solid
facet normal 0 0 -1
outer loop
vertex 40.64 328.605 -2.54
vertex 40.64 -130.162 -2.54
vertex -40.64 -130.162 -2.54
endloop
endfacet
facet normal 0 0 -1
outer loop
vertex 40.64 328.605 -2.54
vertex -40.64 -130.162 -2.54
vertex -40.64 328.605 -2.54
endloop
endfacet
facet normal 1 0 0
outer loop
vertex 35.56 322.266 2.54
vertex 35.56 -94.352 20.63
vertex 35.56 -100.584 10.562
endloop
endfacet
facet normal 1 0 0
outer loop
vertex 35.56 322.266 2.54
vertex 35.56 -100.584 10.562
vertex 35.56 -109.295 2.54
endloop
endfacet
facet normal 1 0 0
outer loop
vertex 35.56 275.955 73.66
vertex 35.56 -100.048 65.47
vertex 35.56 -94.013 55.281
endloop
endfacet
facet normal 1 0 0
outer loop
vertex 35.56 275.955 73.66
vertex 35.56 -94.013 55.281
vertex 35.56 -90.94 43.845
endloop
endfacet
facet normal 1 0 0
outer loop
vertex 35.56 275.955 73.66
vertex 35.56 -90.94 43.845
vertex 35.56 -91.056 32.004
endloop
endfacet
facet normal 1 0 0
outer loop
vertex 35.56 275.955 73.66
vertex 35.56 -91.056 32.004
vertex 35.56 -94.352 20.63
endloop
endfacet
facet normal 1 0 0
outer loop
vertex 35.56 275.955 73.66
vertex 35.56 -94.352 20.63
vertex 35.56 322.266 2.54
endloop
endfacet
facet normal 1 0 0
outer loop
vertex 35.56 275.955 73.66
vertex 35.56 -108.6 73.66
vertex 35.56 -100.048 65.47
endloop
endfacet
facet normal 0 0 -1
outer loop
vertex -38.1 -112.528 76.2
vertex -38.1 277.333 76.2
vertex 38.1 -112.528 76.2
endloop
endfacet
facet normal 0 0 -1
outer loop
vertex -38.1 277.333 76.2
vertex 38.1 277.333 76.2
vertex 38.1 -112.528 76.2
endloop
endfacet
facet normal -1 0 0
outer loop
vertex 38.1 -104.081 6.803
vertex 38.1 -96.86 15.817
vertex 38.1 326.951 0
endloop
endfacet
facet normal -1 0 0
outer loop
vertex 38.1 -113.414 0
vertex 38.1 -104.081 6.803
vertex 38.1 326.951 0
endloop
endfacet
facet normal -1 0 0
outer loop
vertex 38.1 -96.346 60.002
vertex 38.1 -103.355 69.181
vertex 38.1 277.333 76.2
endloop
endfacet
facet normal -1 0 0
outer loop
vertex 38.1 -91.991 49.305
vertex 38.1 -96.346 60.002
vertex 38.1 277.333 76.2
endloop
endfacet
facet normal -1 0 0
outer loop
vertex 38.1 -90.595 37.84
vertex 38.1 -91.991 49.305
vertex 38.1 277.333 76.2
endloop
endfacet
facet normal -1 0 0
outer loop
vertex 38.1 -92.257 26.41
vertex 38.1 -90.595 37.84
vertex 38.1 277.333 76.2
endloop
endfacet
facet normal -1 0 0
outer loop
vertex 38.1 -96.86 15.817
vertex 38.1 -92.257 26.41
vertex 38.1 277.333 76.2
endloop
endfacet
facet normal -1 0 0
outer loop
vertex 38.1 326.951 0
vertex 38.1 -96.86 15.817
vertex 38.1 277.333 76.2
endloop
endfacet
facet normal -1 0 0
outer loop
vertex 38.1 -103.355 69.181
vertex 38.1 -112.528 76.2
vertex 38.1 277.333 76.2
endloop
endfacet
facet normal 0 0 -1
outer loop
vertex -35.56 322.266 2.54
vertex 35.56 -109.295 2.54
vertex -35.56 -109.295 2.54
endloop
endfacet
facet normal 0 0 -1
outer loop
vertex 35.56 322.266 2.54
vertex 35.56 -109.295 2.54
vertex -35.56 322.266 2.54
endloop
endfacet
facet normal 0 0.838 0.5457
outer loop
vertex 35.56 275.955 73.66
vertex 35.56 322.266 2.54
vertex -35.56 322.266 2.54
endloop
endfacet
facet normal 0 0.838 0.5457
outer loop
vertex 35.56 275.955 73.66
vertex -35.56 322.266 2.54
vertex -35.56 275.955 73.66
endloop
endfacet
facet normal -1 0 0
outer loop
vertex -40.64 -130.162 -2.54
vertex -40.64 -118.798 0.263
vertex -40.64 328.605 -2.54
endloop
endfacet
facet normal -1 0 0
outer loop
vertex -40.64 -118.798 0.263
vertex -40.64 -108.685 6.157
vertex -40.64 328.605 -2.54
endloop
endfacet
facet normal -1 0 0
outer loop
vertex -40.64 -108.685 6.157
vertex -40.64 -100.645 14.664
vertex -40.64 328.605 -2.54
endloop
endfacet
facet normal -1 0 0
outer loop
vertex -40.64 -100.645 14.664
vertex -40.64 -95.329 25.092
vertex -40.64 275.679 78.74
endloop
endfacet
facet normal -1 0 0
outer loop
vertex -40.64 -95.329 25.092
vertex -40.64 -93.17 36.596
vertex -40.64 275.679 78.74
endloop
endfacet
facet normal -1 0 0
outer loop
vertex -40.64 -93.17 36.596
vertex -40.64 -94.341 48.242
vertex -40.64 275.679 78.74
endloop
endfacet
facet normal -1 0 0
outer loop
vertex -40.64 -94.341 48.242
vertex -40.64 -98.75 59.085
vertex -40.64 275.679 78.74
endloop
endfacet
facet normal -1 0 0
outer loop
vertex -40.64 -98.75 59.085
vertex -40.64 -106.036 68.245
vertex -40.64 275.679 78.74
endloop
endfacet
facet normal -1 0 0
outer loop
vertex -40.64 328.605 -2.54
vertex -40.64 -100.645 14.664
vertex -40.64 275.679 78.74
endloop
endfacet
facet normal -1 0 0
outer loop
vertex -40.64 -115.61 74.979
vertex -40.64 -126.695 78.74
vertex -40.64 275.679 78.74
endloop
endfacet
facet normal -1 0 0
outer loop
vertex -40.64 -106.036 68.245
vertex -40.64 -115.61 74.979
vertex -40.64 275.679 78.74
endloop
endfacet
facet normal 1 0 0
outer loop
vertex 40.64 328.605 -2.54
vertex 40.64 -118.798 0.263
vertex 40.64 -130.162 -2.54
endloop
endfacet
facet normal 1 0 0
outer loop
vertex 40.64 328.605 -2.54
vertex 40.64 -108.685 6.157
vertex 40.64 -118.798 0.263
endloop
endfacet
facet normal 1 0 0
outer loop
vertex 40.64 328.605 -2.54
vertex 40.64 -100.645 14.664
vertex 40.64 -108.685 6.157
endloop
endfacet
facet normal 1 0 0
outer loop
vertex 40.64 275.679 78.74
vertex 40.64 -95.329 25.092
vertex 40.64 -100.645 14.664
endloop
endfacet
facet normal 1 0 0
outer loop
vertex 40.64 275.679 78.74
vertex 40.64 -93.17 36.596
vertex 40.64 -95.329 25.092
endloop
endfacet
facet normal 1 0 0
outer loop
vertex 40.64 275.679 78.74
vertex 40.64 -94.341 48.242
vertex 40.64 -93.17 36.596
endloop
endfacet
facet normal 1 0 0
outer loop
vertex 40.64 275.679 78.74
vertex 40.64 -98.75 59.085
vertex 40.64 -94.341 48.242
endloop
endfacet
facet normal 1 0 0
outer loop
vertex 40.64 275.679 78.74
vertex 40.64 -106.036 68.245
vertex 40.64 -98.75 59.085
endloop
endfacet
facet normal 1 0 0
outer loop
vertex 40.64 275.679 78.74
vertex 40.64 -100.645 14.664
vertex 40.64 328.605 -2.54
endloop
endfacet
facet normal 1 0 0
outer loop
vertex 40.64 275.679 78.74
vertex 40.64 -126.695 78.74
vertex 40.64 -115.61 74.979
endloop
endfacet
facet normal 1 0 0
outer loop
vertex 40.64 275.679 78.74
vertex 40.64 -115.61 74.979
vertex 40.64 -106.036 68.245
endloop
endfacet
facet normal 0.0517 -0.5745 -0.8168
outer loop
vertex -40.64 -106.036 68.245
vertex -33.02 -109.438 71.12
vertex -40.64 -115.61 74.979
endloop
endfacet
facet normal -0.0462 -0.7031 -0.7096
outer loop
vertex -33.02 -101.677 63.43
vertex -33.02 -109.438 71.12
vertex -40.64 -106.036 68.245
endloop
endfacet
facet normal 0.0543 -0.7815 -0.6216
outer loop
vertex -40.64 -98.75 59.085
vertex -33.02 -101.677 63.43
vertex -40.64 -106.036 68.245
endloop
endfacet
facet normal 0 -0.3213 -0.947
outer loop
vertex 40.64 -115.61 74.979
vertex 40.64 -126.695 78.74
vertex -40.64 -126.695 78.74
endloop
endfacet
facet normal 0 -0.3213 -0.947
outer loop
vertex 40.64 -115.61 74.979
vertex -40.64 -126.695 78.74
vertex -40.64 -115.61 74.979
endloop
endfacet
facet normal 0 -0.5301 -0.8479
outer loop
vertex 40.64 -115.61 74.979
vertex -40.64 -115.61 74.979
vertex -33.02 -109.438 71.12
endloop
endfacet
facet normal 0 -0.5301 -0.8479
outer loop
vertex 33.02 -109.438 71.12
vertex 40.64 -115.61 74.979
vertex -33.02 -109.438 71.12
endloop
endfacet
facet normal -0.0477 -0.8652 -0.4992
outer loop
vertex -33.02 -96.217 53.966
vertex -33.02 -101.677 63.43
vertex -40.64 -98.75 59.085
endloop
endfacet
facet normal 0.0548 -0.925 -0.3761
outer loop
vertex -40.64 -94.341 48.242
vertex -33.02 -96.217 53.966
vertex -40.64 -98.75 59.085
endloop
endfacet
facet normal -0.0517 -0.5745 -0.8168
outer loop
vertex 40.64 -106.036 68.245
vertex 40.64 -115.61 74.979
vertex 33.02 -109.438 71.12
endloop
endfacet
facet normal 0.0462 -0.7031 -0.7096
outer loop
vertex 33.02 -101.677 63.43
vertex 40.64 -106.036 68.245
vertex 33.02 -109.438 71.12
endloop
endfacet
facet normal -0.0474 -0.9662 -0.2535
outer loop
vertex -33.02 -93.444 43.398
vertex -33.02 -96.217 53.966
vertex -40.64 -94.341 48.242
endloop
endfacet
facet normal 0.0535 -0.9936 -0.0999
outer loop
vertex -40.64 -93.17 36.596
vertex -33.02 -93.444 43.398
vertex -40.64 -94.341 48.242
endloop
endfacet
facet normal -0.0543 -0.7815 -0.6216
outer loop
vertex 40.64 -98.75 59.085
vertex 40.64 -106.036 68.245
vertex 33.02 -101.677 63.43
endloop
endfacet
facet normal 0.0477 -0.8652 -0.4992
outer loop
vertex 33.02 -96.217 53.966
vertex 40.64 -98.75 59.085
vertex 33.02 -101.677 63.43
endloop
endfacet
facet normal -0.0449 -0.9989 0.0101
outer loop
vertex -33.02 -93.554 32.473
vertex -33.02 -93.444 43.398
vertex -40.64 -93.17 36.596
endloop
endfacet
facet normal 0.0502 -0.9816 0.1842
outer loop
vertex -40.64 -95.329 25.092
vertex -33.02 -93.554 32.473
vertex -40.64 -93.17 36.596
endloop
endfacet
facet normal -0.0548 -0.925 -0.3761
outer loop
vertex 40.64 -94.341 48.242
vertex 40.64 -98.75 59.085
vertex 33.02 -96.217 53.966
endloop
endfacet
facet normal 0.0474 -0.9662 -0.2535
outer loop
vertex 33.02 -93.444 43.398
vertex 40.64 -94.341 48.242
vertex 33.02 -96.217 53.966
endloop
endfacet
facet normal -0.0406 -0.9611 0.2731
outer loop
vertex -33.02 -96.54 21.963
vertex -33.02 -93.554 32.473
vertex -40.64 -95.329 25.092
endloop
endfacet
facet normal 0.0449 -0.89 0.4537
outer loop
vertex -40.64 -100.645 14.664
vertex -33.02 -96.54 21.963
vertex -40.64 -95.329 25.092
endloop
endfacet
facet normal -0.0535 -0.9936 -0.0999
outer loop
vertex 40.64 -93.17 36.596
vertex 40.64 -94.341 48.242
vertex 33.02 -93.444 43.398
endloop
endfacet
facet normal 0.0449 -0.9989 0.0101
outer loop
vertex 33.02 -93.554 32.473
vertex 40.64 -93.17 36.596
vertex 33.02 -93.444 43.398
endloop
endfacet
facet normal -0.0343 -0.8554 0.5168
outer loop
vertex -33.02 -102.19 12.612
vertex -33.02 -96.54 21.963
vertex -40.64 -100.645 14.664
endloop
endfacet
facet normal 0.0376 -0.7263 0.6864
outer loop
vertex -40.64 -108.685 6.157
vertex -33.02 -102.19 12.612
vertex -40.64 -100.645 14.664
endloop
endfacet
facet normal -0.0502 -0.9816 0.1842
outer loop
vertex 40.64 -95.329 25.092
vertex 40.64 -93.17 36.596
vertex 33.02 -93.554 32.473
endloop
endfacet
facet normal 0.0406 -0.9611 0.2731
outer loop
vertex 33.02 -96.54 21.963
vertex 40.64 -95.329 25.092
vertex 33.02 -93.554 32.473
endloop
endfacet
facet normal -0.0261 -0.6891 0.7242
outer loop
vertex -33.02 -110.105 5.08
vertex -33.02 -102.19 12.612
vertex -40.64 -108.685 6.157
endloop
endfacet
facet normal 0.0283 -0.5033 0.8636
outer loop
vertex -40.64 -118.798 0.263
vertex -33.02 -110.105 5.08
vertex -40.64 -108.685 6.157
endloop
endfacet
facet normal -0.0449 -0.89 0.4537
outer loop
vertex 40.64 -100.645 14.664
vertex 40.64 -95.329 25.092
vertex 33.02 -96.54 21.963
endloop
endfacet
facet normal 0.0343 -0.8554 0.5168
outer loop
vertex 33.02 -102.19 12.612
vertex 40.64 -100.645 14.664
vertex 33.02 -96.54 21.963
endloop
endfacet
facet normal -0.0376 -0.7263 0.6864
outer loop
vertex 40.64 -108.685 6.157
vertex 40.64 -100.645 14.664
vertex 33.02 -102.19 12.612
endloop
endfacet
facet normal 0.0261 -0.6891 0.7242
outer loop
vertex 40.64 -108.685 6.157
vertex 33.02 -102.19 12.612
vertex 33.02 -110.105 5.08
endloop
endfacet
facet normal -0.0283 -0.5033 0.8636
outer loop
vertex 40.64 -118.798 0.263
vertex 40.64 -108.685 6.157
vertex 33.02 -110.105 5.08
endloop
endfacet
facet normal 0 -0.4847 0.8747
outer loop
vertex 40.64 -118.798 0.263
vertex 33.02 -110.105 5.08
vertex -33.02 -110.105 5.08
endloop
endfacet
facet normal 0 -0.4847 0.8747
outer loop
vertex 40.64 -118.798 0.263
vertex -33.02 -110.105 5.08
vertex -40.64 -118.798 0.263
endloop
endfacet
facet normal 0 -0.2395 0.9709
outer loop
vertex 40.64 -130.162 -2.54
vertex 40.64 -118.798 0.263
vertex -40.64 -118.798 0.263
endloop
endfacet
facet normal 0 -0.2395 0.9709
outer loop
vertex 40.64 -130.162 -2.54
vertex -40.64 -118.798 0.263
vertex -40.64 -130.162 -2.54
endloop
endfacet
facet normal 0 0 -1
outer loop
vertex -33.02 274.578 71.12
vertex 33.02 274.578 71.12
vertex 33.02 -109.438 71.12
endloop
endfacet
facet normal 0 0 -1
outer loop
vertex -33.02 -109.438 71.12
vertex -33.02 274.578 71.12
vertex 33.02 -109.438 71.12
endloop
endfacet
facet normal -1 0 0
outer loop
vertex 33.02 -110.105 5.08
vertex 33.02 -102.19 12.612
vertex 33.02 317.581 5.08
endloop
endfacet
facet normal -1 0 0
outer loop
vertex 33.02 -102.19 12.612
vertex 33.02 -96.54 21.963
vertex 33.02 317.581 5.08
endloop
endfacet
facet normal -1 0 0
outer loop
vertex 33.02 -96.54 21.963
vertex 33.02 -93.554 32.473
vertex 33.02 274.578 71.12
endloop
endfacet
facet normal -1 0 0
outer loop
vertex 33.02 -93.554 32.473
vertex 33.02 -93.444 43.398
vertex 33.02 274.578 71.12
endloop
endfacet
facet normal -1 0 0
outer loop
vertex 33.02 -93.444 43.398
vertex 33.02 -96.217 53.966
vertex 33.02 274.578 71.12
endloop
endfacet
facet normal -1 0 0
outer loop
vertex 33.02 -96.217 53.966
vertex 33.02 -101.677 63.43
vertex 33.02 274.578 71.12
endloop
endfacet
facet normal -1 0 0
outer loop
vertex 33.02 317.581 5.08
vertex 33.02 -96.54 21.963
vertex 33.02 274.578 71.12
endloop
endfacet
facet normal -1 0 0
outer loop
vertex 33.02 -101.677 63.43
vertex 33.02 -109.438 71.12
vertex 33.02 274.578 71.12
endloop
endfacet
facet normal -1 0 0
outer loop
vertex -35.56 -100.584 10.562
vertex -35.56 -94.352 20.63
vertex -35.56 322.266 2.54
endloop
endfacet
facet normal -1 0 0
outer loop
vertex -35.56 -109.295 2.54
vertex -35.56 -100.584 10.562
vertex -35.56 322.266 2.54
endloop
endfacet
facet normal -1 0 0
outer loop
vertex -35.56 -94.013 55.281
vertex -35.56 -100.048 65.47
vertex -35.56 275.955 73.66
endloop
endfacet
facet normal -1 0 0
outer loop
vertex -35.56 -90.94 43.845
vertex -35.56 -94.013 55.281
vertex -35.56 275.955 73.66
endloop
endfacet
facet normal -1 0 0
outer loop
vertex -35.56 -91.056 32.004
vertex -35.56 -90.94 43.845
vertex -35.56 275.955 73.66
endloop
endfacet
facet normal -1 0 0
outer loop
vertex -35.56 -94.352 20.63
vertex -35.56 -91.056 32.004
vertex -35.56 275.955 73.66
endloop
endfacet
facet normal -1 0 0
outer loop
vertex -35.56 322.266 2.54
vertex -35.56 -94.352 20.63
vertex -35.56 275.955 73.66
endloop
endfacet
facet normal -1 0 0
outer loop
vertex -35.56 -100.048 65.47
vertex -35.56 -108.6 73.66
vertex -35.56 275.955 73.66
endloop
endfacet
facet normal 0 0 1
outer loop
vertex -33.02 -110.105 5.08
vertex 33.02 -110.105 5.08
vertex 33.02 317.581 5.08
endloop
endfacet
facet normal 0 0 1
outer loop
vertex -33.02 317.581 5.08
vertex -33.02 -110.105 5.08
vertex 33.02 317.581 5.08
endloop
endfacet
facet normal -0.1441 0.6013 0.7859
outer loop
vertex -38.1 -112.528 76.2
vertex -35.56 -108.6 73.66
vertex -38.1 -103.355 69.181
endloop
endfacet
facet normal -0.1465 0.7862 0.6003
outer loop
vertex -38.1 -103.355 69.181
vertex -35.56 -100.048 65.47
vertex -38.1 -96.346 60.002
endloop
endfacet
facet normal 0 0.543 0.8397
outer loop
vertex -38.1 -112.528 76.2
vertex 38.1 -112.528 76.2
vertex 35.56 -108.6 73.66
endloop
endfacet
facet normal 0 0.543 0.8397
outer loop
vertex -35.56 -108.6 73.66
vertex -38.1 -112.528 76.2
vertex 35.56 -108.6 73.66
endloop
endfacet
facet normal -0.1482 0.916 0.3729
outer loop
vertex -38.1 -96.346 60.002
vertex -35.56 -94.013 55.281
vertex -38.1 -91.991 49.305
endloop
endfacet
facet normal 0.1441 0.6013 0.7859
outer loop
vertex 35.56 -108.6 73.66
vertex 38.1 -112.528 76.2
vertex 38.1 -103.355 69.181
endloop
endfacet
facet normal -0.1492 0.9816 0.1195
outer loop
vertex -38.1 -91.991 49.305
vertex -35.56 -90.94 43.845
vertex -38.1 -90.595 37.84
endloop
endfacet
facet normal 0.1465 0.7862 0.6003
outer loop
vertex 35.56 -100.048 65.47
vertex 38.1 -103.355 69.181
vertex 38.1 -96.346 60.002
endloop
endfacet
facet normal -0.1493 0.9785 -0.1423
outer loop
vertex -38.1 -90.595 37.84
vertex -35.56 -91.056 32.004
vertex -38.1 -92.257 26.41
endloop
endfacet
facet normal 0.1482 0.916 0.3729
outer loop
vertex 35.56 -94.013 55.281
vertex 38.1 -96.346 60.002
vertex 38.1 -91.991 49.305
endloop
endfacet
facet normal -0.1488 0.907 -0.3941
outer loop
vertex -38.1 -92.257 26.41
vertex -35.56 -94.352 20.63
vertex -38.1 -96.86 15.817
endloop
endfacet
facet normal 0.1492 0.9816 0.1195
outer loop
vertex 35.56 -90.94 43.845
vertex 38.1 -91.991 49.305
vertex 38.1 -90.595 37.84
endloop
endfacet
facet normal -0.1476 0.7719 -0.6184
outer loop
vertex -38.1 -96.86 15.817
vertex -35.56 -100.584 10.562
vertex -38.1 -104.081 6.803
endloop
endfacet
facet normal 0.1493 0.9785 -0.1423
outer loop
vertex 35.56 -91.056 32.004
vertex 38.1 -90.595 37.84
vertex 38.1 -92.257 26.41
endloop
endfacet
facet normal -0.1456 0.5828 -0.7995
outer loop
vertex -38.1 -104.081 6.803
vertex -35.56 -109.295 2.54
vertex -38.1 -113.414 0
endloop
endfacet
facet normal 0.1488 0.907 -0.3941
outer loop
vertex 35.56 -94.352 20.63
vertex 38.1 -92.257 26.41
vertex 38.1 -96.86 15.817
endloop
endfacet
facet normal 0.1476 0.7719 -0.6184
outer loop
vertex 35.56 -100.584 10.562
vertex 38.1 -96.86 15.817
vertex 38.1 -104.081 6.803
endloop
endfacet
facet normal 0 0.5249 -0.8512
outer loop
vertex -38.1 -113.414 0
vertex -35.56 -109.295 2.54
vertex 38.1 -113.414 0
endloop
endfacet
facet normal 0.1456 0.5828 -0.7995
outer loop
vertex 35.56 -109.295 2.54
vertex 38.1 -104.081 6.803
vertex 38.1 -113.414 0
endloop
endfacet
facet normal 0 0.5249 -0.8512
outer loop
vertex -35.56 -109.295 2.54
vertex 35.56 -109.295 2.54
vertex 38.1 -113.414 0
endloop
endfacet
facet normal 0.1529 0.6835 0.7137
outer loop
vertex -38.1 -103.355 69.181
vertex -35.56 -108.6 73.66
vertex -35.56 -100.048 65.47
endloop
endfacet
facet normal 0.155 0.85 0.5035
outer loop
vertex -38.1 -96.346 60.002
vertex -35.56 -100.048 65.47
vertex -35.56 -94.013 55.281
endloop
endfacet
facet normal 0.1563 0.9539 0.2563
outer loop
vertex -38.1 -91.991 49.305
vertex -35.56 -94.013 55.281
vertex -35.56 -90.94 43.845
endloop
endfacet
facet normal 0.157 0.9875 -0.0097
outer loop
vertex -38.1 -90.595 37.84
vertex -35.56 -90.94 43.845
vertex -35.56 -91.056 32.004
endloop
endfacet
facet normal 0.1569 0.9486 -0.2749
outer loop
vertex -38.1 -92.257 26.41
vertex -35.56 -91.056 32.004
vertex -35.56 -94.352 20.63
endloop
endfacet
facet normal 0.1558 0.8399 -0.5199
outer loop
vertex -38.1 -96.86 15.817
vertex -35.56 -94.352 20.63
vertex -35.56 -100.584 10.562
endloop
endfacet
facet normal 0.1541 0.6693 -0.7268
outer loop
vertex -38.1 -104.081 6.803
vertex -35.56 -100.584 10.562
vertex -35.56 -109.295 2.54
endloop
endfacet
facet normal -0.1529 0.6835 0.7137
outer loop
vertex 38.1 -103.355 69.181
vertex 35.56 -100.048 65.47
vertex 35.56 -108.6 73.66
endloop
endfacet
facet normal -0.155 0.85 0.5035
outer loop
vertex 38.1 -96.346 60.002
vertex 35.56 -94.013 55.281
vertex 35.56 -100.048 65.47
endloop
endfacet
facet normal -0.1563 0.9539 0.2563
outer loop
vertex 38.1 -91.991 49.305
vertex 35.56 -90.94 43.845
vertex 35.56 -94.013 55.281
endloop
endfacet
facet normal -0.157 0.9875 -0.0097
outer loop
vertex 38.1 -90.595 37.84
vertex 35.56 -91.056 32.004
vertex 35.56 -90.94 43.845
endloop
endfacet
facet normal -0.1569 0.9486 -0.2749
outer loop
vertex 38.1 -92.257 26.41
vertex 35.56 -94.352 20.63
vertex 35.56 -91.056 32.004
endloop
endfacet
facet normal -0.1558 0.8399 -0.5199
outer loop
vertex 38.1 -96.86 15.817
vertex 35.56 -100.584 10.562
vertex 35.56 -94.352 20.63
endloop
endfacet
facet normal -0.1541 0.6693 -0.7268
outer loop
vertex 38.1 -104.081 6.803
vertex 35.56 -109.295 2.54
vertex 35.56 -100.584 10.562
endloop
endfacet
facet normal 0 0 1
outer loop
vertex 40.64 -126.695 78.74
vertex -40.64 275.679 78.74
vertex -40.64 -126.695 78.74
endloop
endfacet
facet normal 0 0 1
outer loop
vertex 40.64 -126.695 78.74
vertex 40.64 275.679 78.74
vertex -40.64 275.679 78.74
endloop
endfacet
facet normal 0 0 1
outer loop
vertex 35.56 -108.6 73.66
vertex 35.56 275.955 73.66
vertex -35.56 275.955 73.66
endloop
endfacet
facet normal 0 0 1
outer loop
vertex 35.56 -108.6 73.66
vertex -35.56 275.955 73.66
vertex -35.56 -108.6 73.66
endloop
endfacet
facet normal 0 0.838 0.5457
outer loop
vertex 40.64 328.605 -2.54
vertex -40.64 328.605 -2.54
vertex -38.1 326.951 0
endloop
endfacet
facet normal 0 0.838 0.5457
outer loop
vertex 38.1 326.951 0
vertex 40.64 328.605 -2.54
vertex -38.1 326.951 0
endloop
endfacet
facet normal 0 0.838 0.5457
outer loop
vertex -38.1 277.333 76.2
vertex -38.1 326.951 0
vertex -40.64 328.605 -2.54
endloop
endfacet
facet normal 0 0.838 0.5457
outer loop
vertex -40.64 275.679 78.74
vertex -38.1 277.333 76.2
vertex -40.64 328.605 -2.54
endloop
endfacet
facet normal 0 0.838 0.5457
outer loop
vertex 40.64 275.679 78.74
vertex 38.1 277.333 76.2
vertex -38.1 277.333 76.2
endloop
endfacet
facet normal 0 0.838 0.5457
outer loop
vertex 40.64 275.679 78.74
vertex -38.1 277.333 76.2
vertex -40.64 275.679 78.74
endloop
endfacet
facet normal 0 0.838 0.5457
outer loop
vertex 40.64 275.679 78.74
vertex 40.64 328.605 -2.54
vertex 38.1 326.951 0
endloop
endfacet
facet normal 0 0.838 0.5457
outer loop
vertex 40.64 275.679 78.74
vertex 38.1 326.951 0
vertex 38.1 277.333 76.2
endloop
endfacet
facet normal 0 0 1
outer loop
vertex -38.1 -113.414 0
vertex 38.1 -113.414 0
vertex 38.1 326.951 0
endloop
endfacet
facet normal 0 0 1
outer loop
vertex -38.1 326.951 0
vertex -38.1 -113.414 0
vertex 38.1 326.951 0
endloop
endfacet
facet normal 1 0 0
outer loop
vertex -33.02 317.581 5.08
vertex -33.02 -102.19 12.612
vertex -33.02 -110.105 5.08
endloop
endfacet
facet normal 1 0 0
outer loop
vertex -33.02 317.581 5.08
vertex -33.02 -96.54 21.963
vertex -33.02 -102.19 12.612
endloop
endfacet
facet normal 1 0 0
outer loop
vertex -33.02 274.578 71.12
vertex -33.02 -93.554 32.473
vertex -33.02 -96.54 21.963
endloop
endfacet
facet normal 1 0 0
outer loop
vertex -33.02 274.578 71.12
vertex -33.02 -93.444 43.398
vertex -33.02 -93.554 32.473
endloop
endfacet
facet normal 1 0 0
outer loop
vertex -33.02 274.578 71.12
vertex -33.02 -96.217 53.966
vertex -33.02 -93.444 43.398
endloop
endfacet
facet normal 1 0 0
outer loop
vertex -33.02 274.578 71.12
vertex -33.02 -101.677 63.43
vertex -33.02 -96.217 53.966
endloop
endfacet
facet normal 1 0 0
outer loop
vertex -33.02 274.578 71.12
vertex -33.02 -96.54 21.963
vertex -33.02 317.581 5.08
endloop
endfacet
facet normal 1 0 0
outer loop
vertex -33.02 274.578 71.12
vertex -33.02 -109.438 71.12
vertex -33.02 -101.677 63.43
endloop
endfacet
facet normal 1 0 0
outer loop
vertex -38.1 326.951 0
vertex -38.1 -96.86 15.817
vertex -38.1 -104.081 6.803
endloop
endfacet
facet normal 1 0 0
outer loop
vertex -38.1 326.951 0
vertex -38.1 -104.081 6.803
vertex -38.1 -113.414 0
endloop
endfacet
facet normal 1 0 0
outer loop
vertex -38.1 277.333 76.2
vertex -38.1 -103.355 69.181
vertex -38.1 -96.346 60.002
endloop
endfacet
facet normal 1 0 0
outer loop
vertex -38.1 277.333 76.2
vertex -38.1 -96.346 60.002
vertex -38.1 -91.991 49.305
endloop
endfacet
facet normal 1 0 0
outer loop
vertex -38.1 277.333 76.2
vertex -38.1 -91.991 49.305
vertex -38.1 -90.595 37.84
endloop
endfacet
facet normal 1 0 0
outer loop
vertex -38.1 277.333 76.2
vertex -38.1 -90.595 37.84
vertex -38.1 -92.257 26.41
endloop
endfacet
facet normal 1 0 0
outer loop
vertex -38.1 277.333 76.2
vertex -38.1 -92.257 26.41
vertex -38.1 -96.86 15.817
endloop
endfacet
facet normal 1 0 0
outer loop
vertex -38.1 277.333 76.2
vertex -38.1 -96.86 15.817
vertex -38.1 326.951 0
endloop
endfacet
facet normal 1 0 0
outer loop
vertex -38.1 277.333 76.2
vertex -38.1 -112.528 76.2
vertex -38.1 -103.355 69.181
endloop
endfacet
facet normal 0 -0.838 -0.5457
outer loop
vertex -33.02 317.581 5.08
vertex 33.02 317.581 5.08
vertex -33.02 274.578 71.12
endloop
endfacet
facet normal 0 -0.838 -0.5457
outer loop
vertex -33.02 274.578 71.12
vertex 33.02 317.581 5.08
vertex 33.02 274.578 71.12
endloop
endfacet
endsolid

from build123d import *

# Parameters (mm, degrees)
F1_DEPTH = 38.1
F2_T     = -2.54
F3_T     = 2.54


with BuildPart() as f1:
    # F0 (on Right) → F1 (new body, symmetric)
    with BuildSketch(Plane.YZ):
        with BuildLine():
            Line((277.3325320094, 76.2), (-112.5278806646, 76.2))
            ThreePointArc((-112.5278806646, 76.2), (-90.5951741668, 37.8398160871), (-113.4139305449, 0))
            Line((-113.4139305449, 0), (326.9511687087, 0))
            Line((326.9511687087, 0), (277.3325320094, 76.2))
        make_face()
    extrude(amount=F1_DEPTH, both=True)

    # F2
    f2_openings = [f1.faces().sort_by_distance(p)[0] for p in [
        (0, -90.595174, 37.839816),
    ]]
    offset(amount=F2_T, openings=f2_openings)

    # F3
    f3_openings = [f1.faces().sort_by_distance(p)[0] for p in [
        (0, 302.14185, 38.1),
    ]]
    offset(amount=F3_T, openings=f3_openings, kind=Kind.INTERSECTION)


solid = f1.part
